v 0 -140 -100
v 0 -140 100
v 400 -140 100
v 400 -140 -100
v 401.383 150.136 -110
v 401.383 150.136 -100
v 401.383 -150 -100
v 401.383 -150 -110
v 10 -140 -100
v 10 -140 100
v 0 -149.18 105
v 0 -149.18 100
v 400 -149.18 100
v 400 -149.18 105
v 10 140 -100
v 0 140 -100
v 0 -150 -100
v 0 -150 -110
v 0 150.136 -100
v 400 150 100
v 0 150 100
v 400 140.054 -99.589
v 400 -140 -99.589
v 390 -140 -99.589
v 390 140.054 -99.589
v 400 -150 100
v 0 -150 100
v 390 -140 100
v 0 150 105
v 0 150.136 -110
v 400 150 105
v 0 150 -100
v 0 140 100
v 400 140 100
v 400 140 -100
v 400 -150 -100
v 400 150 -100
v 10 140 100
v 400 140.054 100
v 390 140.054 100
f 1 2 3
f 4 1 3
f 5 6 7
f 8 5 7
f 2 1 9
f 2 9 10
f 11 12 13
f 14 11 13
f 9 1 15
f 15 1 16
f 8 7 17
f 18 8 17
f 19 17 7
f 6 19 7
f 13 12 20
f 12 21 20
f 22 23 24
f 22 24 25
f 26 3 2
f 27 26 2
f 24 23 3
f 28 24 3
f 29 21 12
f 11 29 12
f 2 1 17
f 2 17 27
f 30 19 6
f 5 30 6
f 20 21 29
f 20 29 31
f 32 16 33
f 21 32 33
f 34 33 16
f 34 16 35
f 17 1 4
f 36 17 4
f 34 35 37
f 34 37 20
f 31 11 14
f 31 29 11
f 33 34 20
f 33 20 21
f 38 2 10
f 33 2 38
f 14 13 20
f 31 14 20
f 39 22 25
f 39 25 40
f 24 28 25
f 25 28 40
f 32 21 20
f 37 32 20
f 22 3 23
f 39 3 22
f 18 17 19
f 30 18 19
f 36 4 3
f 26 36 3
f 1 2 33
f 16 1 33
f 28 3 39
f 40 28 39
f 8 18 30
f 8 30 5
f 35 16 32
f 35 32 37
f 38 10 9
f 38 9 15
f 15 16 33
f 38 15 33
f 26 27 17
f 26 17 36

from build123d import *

# Parameters (mm, degrees)
F0_W      = 280
F0_H      = 200
F1_DEPTH  = 10
F2_W      = 390
F2_H      = 200
F2_W_2    = 10
F3_DEPTH  = 10
F5_W      = 280.054449
F5_H      = 199.588737
F6_DEPTH  = 10
F7_W      = 400
F7_H      = 10
F8_DEPTH  = 10
F9_W      = 400
F9_H      = 9.180308
F9_H_2    = 290
F10_DEPTH = 5


with BuildPart() as f1:
    # F0 (on Right) → F1 (new body)
    with BuildSketch(Plane.YZ):
        Rectangle(F0_W, F0_H)
    extrude(amount=F1_DEPTH)


with BuildPart() as f3:
    # F2 (on face) → F3 (new body)
    with BuildSketch(Plane.XZ.offset(140)):
        with Locations((205, 0)):
            Rectangle(F2_W, F2_H)
        with Locations((5, 0)):
            Rectangle(F2_W_2, F2_H)
    extrude(amount=F3_DEPTH)


with BuildPart() as f4_1:
    # F4: instance of F3
    add(f3.part.mirror(Plane.XZ))


with BuildPart() as f6:
    # F5 (on face) → F6 (new body)
    with BuildSketch(Plane.YZ.offset(400)):
        with Locations((0.027225, 0.205632)):
            Rectangle(F5_W, F5_H)
    extrude(amount=-F6_DEPTH)


with BuildPart() as f8:
    # F7 (on face) → F8 (new body)
    with BuildSketch(Plane(origin=(0, 0, -100), x_dir=(1, 0, 0), z_dir=(0, 0, -1))):
        Polygon((401.38334, 150), (400, 150), (400, 140), (0, 140), (0, -150.136411), (401.38334, -150.136411), align=None)
        with Locations((200, 145)):
            Rectangle(F7_W, F7_H)
    extrude(amount=F8_DEPTH)


with BuildPart() as f10:
    # F9 (on face) → F10 (new body)
    with BuildSketch(Plane.XY.offset(100)):
        with Locations((200, -144.590154)):
            Rectangle(F9_W, F9_H)
        with Locations((200, 5)):
            Rectangle(F9_W, F9_H_2)
    extrude(amount=F10_DEPTH)


solid = Compound([f1.part, f3.part, f4_1.part, f6.part, f8.part, f10.part])
